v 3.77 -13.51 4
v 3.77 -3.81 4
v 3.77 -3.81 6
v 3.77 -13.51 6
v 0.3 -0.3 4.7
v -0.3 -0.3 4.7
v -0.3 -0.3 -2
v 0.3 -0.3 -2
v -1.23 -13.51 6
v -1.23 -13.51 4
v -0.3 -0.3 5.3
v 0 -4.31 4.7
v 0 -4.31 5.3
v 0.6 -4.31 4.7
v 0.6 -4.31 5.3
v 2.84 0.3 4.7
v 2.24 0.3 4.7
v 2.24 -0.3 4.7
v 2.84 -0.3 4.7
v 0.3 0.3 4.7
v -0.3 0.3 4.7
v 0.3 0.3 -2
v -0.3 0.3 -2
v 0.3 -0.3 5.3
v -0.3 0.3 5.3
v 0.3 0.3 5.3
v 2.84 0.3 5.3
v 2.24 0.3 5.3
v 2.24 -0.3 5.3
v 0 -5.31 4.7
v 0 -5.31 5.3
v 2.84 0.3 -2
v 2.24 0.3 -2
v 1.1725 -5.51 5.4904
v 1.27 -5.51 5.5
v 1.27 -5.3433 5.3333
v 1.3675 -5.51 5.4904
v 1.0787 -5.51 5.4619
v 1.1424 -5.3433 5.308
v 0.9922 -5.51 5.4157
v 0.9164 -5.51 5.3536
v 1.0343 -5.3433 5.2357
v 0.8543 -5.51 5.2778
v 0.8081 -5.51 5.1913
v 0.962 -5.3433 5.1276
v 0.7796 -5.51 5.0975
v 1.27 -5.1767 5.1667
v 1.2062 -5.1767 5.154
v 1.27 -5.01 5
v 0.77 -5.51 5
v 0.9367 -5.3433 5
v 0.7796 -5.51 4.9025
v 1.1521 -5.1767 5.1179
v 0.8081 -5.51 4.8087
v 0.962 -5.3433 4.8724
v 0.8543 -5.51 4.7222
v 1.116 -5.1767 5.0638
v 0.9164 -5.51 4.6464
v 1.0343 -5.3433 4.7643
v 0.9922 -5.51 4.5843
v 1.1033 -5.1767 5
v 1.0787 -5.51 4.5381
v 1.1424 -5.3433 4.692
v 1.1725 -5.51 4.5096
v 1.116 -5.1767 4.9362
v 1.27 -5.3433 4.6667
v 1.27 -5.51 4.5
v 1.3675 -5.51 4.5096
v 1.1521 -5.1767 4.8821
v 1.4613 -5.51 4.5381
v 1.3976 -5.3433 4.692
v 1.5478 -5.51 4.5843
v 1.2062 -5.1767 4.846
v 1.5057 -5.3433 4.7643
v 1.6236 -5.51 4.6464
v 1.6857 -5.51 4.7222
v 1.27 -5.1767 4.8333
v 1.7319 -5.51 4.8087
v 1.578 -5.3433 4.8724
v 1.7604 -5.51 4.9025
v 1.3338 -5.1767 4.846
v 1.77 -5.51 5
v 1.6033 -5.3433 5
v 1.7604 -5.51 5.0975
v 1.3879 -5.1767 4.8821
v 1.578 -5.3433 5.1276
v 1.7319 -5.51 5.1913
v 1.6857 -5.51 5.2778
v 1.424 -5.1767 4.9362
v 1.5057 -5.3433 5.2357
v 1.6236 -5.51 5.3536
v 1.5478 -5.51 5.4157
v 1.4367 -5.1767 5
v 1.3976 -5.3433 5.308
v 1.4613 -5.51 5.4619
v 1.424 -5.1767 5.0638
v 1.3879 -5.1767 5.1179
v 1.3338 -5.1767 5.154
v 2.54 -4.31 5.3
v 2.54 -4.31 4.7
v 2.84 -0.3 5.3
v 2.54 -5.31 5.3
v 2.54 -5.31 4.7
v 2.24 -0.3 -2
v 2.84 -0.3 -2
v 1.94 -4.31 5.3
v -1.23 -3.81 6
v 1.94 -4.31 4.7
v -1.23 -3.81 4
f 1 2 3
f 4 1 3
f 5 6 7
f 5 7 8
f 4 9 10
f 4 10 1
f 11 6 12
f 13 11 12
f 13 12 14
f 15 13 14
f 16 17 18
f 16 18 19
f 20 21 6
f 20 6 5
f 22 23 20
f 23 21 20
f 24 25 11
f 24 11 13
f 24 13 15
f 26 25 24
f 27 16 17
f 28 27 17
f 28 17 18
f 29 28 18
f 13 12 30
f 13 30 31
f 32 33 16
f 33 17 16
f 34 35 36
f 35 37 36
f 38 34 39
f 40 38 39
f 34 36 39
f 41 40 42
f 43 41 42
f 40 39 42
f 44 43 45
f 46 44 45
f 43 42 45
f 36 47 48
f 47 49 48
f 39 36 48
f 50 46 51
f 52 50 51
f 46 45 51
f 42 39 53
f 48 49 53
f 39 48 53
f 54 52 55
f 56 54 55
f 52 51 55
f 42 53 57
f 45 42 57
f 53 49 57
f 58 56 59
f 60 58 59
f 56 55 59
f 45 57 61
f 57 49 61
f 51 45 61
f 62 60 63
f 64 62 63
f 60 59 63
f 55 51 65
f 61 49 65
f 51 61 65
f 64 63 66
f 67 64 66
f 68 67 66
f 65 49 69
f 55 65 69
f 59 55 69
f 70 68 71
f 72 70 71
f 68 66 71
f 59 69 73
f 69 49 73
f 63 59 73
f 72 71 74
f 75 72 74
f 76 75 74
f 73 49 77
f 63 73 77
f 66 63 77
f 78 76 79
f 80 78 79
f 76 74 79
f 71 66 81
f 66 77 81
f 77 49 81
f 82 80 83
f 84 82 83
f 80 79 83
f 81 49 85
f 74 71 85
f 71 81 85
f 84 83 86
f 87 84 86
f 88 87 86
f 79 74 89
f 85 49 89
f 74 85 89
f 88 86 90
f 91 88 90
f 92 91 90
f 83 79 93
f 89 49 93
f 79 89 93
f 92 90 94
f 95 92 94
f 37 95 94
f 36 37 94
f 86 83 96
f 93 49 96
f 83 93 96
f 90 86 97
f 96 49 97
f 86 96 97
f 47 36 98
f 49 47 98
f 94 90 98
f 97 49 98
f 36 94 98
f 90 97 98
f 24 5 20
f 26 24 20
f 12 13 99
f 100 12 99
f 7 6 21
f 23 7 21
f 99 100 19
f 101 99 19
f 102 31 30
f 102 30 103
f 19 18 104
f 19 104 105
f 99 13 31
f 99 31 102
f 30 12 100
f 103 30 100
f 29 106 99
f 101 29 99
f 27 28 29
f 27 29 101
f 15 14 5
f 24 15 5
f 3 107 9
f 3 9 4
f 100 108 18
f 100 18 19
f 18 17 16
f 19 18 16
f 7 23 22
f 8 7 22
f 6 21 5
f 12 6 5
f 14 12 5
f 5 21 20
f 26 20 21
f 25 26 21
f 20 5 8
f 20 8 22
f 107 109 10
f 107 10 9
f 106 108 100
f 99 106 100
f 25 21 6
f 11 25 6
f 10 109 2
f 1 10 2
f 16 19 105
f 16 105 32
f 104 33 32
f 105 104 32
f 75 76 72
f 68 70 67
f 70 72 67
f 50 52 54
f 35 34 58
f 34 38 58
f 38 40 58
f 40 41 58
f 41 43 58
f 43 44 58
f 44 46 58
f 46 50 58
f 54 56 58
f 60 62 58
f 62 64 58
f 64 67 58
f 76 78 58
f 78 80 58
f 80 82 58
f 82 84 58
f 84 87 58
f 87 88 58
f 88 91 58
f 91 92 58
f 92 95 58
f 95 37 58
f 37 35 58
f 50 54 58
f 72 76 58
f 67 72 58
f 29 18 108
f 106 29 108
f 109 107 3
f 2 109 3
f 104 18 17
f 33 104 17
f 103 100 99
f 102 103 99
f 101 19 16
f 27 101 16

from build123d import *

# Parameters (mm, degrees)
SKETCH_W       = 0.6
SKETCH_H       = 0.6
PAD_DEPTH      = 4.7
PAD_DEPTH_BACK = 2
PAD001_DEPTH   = 0.6
SKETCH002_W    = 2.54
SKETCH002_H    = 0.6
PAD002_DEPTH   = 1
SKETCH004_W    = 5
SKETCH004_H    = 2
PAD003_DEPTH   = 9.7


with BuildPart() as pad:
    # Sketch → Pad (new body, two sides)
    with BuildSketch(Plane.XY) as pad_sk:
        Rectangle(SKETCH_W, SKETCH_H)
        with Locations((2.54, 0)):
            Rectangle(SKETCH_W, SKETCH_H)
    extrude(amount=PAD_DEPTH)
    extrude(pad_sk.sketch, amount=-PAD_DEPTH_BACK)


with BuildPart() as pad001:
    # Sketch001 → Pad001 (new body)
    with BuildSketch(Plane.XY.offset(4.7)):
        Polygon((0.3, 0.3), (-0.3, 0.3), (-0.3, -0.3), (0, -4.31), (0.6, -4.31), (0.3, -0.3), align=None)
        Polygon((2.84, 0.3), (2.24, 0.3), (2.24, -0.3), (1.94, -4.31), (2.54, -4.31), (2.84, -0.3), align=None)
    extrude(amount=PAD001_DEPTH)


with BuildPart() as pad002:
    # Sketch002 → Pad002 (new body)
    with BuildSketch(Plane.XZ.offset(4.31)):
        with Locations((1.27, 5)):
            Rectangle(SKETCH002_W, SKETCH002_H)
    extrude(amount=PAD002_DEPTH)


with BuildPart() as pad003:
    # Sketch004 → Pad003 (new body)
    with BuildSketch(Plane.XZ.offset(3.81)):
        with Locations((1.27, 5)):
            Rectangle(SKETCH004_W, SKETCH004_H)
    extrude(amount=PAD003_DEPTH)


with BuildPart() as revolution001:
    # Sketch005 → Revolution001 (revolve)
    with BuildSketch(Plane.YZ.offset(1.27)):
        Polygon((-5.01, 5), (-5.51, 5), (-5.51, 5.5), align=None)
    revolve(axis=Axis((1.27, -3.977201, 5), (0, -1, 0)))


solid = Compound([pad.part, pad001.part, pad002.part, pad003.part, revolution001.part])
